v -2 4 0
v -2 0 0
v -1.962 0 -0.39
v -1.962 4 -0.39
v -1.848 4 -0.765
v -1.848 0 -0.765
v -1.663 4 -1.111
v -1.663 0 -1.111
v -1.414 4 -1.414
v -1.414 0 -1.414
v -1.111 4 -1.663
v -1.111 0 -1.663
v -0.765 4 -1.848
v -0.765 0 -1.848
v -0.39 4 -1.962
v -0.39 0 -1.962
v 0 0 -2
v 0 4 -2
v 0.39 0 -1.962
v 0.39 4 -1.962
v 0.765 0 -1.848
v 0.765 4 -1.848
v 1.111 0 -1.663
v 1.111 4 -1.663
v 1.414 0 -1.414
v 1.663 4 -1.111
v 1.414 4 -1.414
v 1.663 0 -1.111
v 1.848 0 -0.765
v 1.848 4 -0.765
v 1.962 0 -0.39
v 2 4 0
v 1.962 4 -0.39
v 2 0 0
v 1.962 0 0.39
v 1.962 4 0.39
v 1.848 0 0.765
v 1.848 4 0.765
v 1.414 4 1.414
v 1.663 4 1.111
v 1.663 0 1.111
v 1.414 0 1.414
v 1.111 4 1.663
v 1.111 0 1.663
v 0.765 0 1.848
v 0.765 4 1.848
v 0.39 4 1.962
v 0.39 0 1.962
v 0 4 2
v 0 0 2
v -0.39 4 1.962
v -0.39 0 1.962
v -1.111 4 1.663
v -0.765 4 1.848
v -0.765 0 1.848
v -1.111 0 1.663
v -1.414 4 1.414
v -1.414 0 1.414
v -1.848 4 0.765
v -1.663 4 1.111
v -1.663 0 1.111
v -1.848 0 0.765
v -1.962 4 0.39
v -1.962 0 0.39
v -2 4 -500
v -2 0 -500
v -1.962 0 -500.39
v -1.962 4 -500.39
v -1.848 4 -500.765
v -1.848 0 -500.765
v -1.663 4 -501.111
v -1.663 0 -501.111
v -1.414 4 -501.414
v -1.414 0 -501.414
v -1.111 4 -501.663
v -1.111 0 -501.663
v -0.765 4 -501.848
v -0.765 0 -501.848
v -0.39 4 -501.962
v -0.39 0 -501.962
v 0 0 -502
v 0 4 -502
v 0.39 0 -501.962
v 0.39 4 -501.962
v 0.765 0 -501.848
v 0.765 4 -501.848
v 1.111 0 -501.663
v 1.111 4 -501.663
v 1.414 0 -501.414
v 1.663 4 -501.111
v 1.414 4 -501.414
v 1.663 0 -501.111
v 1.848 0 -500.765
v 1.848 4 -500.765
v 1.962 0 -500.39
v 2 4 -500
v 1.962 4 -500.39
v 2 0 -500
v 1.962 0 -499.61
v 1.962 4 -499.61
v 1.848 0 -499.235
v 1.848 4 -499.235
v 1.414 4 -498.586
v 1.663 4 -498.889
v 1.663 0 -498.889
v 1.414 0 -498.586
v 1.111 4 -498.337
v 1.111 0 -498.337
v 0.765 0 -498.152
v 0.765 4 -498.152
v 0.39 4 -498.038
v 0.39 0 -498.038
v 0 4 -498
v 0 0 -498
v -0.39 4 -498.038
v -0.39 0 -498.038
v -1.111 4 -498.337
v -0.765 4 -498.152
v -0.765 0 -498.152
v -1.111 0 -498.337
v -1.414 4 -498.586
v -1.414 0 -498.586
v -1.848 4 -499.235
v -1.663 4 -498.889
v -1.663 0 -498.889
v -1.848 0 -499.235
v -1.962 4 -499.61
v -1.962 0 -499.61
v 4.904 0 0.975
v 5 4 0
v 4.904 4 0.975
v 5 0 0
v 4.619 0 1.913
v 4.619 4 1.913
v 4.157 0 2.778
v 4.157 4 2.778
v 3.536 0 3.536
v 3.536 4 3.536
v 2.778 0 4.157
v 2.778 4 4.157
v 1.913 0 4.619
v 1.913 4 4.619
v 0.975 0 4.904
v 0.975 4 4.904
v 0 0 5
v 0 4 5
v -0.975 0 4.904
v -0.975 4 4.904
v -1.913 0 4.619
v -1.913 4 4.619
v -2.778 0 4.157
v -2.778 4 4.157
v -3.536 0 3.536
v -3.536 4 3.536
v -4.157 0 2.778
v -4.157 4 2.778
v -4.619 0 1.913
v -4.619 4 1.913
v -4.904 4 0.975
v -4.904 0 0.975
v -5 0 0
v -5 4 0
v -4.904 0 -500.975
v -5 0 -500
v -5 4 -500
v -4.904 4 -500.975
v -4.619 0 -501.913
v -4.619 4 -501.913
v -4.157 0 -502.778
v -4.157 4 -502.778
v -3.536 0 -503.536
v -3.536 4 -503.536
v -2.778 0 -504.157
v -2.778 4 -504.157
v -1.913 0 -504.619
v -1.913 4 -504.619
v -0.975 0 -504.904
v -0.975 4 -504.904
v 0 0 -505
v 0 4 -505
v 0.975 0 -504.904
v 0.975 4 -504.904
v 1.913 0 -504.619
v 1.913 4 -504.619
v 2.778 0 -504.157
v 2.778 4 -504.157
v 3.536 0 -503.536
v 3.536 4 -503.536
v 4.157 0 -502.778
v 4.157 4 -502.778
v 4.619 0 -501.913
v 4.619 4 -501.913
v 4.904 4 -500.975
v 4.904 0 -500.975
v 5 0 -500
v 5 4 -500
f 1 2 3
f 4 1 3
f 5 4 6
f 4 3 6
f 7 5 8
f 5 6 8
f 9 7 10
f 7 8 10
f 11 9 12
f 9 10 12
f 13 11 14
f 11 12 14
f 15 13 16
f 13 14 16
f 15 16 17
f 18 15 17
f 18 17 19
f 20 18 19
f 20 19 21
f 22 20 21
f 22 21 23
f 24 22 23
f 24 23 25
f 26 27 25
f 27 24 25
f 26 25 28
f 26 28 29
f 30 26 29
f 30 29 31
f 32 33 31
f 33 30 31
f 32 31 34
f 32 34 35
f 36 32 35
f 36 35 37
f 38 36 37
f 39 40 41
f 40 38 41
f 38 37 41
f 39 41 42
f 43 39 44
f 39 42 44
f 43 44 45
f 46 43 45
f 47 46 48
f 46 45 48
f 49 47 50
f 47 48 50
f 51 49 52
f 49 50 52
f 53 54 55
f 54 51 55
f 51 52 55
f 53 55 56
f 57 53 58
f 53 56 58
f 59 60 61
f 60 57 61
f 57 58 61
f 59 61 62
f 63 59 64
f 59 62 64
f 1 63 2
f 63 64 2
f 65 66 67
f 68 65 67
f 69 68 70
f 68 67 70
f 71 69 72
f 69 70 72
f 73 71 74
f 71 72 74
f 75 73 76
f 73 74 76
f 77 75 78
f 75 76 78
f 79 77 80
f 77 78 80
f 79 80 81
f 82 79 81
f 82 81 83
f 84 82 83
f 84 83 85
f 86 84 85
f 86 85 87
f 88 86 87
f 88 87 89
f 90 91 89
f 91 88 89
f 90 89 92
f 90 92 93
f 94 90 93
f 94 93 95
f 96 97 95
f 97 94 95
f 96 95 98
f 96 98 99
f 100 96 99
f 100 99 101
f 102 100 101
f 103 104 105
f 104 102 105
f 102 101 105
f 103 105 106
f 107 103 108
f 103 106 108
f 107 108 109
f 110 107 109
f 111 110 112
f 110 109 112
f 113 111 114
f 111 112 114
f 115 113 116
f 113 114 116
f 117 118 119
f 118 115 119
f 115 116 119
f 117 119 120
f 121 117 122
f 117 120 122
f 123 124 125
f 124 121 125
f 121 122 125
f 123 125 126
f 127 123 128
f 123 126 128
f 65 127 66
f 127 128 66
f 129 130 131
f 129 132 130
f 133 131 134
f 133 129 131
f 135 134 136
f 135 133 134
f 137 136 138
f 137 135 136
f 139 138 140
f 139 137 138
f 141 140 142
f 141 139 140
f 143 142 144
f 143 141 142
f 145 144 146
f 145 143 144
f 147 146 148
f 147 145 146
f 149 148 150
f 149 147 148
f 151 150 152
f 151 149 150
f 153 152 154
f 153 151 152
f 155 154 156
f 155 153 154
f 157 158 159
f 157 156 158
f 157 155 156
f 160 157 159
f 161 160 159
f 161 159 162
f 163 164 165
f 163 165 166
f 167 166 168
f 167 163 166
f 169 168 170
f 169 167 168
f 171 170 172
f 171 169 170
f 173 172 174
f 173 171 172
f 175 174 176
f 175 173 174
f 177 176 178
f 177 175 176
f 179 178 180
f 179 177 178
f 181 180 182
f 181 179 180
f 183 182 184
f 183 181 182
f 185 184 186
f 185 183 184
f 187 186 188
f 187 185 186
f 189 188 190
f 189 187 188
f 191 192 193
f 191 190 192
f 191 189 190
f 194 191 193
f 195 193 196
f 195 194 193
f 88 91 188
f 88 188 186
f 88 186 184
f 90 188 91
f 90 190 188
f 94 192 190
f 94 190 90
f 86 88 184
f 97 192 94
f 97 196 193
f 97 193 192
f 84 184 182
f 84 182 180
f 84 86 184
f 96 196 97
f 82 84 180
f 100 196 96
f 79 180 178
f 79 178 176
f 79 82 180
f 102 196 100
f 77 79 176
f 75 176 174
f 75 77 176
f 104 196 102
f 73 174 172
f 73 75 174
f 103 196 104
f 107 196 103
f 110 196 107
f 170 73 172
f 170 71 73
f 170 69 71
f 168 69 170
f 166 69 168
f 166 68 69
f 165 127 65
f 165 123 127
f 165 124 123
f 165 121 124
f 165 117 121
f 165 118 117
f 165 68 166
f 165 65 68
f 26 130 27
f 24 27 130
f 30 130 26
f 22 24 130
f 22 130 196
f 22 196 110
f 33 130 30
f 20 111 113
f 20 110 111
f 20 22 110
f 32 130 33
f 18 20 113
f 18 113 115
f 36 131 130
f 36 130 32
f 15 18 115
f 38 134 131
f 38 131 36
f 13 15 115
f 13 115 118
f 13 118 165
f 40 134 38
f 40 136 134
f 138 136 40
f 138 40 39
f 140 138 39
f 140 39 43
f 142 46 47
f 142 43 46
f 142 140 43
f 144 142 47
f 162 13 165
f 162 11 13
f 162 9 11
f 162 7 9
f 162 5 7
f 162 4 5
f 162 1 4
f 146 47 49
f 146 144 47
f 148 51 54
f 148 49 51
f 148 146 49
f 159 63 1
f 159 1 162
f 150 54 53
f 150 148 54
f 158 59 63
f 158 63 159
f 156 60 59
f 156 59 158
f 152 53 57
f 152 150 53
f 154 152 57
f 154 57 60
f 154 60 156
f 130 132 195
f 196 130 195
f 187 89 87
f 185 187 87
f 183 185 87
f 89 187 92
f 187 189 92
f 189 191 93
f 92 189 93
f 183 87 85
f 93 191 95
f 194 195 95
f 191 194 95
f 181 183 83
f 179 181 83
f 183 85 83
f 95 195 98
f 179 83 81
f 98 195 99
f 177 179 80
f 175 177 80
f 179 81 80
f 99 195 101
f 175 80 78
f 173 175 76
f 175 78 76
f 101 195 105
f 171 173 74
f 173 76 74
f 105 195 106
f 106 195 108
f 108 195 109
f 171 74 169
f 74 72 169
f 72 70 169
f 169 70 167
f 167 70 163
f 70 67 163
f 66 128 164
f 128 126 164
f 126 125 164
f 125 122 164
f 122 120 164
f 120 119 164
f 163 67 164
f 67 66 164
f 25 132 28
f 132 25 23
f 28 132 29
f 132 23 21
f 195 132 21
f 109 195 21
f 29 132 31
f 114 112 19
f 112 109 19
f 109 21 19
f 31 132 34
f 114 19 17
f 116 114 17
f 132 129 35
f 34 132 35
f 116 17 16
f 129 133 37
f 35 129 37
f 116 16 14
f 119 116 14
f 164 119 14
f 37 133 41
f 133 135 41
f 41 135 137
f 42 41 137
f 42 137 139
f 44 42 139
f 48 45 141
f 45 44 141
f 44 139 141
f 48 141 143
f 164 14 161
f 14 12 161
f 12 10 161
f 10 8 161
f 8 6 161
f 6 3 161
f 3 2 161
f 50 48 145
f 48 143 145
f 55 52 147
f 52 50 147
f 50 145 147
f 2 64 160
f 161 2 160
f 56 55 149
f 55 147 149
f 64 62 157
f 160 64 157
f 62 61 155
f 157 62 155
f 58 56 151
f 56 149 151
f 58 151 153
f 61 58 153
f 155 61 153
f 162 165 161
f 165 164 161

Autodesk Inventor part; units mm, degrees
ref_plane "XZ Plane" through (0, 0, 0) normal (0, 1, 0) x (-1, 0, 0)
ref_plane "XY Plane" through (0, 0, 0) normal (0, 0, 1) x (1, 0, 0)
sketch "Sketch1" plane through (0, 0, 0) normal (0, 1, 0) x (-1, 0, 0)
  line L0 (0, 0) -> (0, -500) construction
  line L1 (-5, 0) -> (-5, -500)
  line L2 (5, -500) -> (5, 0)
  arc A0 (5, 0) -> (-5, 0) centre (0, 0) ccw
  arc A1 (-5, -500) -> (5, -500) centre (0, -500) ccw
  circle A2 centre (0, 0) radius 2
  circle A3 centre (0, -500) radius 2
  point P0 (0, -250)
  dimension "d0" = 500
  dimension "d1" = 10
  dimension "d2" = 4
  dimension "d3" = 4
extrude "Extrusion1" add sketch "Sketch1" along normal blind 4
properties part number "Test_arm_3"
